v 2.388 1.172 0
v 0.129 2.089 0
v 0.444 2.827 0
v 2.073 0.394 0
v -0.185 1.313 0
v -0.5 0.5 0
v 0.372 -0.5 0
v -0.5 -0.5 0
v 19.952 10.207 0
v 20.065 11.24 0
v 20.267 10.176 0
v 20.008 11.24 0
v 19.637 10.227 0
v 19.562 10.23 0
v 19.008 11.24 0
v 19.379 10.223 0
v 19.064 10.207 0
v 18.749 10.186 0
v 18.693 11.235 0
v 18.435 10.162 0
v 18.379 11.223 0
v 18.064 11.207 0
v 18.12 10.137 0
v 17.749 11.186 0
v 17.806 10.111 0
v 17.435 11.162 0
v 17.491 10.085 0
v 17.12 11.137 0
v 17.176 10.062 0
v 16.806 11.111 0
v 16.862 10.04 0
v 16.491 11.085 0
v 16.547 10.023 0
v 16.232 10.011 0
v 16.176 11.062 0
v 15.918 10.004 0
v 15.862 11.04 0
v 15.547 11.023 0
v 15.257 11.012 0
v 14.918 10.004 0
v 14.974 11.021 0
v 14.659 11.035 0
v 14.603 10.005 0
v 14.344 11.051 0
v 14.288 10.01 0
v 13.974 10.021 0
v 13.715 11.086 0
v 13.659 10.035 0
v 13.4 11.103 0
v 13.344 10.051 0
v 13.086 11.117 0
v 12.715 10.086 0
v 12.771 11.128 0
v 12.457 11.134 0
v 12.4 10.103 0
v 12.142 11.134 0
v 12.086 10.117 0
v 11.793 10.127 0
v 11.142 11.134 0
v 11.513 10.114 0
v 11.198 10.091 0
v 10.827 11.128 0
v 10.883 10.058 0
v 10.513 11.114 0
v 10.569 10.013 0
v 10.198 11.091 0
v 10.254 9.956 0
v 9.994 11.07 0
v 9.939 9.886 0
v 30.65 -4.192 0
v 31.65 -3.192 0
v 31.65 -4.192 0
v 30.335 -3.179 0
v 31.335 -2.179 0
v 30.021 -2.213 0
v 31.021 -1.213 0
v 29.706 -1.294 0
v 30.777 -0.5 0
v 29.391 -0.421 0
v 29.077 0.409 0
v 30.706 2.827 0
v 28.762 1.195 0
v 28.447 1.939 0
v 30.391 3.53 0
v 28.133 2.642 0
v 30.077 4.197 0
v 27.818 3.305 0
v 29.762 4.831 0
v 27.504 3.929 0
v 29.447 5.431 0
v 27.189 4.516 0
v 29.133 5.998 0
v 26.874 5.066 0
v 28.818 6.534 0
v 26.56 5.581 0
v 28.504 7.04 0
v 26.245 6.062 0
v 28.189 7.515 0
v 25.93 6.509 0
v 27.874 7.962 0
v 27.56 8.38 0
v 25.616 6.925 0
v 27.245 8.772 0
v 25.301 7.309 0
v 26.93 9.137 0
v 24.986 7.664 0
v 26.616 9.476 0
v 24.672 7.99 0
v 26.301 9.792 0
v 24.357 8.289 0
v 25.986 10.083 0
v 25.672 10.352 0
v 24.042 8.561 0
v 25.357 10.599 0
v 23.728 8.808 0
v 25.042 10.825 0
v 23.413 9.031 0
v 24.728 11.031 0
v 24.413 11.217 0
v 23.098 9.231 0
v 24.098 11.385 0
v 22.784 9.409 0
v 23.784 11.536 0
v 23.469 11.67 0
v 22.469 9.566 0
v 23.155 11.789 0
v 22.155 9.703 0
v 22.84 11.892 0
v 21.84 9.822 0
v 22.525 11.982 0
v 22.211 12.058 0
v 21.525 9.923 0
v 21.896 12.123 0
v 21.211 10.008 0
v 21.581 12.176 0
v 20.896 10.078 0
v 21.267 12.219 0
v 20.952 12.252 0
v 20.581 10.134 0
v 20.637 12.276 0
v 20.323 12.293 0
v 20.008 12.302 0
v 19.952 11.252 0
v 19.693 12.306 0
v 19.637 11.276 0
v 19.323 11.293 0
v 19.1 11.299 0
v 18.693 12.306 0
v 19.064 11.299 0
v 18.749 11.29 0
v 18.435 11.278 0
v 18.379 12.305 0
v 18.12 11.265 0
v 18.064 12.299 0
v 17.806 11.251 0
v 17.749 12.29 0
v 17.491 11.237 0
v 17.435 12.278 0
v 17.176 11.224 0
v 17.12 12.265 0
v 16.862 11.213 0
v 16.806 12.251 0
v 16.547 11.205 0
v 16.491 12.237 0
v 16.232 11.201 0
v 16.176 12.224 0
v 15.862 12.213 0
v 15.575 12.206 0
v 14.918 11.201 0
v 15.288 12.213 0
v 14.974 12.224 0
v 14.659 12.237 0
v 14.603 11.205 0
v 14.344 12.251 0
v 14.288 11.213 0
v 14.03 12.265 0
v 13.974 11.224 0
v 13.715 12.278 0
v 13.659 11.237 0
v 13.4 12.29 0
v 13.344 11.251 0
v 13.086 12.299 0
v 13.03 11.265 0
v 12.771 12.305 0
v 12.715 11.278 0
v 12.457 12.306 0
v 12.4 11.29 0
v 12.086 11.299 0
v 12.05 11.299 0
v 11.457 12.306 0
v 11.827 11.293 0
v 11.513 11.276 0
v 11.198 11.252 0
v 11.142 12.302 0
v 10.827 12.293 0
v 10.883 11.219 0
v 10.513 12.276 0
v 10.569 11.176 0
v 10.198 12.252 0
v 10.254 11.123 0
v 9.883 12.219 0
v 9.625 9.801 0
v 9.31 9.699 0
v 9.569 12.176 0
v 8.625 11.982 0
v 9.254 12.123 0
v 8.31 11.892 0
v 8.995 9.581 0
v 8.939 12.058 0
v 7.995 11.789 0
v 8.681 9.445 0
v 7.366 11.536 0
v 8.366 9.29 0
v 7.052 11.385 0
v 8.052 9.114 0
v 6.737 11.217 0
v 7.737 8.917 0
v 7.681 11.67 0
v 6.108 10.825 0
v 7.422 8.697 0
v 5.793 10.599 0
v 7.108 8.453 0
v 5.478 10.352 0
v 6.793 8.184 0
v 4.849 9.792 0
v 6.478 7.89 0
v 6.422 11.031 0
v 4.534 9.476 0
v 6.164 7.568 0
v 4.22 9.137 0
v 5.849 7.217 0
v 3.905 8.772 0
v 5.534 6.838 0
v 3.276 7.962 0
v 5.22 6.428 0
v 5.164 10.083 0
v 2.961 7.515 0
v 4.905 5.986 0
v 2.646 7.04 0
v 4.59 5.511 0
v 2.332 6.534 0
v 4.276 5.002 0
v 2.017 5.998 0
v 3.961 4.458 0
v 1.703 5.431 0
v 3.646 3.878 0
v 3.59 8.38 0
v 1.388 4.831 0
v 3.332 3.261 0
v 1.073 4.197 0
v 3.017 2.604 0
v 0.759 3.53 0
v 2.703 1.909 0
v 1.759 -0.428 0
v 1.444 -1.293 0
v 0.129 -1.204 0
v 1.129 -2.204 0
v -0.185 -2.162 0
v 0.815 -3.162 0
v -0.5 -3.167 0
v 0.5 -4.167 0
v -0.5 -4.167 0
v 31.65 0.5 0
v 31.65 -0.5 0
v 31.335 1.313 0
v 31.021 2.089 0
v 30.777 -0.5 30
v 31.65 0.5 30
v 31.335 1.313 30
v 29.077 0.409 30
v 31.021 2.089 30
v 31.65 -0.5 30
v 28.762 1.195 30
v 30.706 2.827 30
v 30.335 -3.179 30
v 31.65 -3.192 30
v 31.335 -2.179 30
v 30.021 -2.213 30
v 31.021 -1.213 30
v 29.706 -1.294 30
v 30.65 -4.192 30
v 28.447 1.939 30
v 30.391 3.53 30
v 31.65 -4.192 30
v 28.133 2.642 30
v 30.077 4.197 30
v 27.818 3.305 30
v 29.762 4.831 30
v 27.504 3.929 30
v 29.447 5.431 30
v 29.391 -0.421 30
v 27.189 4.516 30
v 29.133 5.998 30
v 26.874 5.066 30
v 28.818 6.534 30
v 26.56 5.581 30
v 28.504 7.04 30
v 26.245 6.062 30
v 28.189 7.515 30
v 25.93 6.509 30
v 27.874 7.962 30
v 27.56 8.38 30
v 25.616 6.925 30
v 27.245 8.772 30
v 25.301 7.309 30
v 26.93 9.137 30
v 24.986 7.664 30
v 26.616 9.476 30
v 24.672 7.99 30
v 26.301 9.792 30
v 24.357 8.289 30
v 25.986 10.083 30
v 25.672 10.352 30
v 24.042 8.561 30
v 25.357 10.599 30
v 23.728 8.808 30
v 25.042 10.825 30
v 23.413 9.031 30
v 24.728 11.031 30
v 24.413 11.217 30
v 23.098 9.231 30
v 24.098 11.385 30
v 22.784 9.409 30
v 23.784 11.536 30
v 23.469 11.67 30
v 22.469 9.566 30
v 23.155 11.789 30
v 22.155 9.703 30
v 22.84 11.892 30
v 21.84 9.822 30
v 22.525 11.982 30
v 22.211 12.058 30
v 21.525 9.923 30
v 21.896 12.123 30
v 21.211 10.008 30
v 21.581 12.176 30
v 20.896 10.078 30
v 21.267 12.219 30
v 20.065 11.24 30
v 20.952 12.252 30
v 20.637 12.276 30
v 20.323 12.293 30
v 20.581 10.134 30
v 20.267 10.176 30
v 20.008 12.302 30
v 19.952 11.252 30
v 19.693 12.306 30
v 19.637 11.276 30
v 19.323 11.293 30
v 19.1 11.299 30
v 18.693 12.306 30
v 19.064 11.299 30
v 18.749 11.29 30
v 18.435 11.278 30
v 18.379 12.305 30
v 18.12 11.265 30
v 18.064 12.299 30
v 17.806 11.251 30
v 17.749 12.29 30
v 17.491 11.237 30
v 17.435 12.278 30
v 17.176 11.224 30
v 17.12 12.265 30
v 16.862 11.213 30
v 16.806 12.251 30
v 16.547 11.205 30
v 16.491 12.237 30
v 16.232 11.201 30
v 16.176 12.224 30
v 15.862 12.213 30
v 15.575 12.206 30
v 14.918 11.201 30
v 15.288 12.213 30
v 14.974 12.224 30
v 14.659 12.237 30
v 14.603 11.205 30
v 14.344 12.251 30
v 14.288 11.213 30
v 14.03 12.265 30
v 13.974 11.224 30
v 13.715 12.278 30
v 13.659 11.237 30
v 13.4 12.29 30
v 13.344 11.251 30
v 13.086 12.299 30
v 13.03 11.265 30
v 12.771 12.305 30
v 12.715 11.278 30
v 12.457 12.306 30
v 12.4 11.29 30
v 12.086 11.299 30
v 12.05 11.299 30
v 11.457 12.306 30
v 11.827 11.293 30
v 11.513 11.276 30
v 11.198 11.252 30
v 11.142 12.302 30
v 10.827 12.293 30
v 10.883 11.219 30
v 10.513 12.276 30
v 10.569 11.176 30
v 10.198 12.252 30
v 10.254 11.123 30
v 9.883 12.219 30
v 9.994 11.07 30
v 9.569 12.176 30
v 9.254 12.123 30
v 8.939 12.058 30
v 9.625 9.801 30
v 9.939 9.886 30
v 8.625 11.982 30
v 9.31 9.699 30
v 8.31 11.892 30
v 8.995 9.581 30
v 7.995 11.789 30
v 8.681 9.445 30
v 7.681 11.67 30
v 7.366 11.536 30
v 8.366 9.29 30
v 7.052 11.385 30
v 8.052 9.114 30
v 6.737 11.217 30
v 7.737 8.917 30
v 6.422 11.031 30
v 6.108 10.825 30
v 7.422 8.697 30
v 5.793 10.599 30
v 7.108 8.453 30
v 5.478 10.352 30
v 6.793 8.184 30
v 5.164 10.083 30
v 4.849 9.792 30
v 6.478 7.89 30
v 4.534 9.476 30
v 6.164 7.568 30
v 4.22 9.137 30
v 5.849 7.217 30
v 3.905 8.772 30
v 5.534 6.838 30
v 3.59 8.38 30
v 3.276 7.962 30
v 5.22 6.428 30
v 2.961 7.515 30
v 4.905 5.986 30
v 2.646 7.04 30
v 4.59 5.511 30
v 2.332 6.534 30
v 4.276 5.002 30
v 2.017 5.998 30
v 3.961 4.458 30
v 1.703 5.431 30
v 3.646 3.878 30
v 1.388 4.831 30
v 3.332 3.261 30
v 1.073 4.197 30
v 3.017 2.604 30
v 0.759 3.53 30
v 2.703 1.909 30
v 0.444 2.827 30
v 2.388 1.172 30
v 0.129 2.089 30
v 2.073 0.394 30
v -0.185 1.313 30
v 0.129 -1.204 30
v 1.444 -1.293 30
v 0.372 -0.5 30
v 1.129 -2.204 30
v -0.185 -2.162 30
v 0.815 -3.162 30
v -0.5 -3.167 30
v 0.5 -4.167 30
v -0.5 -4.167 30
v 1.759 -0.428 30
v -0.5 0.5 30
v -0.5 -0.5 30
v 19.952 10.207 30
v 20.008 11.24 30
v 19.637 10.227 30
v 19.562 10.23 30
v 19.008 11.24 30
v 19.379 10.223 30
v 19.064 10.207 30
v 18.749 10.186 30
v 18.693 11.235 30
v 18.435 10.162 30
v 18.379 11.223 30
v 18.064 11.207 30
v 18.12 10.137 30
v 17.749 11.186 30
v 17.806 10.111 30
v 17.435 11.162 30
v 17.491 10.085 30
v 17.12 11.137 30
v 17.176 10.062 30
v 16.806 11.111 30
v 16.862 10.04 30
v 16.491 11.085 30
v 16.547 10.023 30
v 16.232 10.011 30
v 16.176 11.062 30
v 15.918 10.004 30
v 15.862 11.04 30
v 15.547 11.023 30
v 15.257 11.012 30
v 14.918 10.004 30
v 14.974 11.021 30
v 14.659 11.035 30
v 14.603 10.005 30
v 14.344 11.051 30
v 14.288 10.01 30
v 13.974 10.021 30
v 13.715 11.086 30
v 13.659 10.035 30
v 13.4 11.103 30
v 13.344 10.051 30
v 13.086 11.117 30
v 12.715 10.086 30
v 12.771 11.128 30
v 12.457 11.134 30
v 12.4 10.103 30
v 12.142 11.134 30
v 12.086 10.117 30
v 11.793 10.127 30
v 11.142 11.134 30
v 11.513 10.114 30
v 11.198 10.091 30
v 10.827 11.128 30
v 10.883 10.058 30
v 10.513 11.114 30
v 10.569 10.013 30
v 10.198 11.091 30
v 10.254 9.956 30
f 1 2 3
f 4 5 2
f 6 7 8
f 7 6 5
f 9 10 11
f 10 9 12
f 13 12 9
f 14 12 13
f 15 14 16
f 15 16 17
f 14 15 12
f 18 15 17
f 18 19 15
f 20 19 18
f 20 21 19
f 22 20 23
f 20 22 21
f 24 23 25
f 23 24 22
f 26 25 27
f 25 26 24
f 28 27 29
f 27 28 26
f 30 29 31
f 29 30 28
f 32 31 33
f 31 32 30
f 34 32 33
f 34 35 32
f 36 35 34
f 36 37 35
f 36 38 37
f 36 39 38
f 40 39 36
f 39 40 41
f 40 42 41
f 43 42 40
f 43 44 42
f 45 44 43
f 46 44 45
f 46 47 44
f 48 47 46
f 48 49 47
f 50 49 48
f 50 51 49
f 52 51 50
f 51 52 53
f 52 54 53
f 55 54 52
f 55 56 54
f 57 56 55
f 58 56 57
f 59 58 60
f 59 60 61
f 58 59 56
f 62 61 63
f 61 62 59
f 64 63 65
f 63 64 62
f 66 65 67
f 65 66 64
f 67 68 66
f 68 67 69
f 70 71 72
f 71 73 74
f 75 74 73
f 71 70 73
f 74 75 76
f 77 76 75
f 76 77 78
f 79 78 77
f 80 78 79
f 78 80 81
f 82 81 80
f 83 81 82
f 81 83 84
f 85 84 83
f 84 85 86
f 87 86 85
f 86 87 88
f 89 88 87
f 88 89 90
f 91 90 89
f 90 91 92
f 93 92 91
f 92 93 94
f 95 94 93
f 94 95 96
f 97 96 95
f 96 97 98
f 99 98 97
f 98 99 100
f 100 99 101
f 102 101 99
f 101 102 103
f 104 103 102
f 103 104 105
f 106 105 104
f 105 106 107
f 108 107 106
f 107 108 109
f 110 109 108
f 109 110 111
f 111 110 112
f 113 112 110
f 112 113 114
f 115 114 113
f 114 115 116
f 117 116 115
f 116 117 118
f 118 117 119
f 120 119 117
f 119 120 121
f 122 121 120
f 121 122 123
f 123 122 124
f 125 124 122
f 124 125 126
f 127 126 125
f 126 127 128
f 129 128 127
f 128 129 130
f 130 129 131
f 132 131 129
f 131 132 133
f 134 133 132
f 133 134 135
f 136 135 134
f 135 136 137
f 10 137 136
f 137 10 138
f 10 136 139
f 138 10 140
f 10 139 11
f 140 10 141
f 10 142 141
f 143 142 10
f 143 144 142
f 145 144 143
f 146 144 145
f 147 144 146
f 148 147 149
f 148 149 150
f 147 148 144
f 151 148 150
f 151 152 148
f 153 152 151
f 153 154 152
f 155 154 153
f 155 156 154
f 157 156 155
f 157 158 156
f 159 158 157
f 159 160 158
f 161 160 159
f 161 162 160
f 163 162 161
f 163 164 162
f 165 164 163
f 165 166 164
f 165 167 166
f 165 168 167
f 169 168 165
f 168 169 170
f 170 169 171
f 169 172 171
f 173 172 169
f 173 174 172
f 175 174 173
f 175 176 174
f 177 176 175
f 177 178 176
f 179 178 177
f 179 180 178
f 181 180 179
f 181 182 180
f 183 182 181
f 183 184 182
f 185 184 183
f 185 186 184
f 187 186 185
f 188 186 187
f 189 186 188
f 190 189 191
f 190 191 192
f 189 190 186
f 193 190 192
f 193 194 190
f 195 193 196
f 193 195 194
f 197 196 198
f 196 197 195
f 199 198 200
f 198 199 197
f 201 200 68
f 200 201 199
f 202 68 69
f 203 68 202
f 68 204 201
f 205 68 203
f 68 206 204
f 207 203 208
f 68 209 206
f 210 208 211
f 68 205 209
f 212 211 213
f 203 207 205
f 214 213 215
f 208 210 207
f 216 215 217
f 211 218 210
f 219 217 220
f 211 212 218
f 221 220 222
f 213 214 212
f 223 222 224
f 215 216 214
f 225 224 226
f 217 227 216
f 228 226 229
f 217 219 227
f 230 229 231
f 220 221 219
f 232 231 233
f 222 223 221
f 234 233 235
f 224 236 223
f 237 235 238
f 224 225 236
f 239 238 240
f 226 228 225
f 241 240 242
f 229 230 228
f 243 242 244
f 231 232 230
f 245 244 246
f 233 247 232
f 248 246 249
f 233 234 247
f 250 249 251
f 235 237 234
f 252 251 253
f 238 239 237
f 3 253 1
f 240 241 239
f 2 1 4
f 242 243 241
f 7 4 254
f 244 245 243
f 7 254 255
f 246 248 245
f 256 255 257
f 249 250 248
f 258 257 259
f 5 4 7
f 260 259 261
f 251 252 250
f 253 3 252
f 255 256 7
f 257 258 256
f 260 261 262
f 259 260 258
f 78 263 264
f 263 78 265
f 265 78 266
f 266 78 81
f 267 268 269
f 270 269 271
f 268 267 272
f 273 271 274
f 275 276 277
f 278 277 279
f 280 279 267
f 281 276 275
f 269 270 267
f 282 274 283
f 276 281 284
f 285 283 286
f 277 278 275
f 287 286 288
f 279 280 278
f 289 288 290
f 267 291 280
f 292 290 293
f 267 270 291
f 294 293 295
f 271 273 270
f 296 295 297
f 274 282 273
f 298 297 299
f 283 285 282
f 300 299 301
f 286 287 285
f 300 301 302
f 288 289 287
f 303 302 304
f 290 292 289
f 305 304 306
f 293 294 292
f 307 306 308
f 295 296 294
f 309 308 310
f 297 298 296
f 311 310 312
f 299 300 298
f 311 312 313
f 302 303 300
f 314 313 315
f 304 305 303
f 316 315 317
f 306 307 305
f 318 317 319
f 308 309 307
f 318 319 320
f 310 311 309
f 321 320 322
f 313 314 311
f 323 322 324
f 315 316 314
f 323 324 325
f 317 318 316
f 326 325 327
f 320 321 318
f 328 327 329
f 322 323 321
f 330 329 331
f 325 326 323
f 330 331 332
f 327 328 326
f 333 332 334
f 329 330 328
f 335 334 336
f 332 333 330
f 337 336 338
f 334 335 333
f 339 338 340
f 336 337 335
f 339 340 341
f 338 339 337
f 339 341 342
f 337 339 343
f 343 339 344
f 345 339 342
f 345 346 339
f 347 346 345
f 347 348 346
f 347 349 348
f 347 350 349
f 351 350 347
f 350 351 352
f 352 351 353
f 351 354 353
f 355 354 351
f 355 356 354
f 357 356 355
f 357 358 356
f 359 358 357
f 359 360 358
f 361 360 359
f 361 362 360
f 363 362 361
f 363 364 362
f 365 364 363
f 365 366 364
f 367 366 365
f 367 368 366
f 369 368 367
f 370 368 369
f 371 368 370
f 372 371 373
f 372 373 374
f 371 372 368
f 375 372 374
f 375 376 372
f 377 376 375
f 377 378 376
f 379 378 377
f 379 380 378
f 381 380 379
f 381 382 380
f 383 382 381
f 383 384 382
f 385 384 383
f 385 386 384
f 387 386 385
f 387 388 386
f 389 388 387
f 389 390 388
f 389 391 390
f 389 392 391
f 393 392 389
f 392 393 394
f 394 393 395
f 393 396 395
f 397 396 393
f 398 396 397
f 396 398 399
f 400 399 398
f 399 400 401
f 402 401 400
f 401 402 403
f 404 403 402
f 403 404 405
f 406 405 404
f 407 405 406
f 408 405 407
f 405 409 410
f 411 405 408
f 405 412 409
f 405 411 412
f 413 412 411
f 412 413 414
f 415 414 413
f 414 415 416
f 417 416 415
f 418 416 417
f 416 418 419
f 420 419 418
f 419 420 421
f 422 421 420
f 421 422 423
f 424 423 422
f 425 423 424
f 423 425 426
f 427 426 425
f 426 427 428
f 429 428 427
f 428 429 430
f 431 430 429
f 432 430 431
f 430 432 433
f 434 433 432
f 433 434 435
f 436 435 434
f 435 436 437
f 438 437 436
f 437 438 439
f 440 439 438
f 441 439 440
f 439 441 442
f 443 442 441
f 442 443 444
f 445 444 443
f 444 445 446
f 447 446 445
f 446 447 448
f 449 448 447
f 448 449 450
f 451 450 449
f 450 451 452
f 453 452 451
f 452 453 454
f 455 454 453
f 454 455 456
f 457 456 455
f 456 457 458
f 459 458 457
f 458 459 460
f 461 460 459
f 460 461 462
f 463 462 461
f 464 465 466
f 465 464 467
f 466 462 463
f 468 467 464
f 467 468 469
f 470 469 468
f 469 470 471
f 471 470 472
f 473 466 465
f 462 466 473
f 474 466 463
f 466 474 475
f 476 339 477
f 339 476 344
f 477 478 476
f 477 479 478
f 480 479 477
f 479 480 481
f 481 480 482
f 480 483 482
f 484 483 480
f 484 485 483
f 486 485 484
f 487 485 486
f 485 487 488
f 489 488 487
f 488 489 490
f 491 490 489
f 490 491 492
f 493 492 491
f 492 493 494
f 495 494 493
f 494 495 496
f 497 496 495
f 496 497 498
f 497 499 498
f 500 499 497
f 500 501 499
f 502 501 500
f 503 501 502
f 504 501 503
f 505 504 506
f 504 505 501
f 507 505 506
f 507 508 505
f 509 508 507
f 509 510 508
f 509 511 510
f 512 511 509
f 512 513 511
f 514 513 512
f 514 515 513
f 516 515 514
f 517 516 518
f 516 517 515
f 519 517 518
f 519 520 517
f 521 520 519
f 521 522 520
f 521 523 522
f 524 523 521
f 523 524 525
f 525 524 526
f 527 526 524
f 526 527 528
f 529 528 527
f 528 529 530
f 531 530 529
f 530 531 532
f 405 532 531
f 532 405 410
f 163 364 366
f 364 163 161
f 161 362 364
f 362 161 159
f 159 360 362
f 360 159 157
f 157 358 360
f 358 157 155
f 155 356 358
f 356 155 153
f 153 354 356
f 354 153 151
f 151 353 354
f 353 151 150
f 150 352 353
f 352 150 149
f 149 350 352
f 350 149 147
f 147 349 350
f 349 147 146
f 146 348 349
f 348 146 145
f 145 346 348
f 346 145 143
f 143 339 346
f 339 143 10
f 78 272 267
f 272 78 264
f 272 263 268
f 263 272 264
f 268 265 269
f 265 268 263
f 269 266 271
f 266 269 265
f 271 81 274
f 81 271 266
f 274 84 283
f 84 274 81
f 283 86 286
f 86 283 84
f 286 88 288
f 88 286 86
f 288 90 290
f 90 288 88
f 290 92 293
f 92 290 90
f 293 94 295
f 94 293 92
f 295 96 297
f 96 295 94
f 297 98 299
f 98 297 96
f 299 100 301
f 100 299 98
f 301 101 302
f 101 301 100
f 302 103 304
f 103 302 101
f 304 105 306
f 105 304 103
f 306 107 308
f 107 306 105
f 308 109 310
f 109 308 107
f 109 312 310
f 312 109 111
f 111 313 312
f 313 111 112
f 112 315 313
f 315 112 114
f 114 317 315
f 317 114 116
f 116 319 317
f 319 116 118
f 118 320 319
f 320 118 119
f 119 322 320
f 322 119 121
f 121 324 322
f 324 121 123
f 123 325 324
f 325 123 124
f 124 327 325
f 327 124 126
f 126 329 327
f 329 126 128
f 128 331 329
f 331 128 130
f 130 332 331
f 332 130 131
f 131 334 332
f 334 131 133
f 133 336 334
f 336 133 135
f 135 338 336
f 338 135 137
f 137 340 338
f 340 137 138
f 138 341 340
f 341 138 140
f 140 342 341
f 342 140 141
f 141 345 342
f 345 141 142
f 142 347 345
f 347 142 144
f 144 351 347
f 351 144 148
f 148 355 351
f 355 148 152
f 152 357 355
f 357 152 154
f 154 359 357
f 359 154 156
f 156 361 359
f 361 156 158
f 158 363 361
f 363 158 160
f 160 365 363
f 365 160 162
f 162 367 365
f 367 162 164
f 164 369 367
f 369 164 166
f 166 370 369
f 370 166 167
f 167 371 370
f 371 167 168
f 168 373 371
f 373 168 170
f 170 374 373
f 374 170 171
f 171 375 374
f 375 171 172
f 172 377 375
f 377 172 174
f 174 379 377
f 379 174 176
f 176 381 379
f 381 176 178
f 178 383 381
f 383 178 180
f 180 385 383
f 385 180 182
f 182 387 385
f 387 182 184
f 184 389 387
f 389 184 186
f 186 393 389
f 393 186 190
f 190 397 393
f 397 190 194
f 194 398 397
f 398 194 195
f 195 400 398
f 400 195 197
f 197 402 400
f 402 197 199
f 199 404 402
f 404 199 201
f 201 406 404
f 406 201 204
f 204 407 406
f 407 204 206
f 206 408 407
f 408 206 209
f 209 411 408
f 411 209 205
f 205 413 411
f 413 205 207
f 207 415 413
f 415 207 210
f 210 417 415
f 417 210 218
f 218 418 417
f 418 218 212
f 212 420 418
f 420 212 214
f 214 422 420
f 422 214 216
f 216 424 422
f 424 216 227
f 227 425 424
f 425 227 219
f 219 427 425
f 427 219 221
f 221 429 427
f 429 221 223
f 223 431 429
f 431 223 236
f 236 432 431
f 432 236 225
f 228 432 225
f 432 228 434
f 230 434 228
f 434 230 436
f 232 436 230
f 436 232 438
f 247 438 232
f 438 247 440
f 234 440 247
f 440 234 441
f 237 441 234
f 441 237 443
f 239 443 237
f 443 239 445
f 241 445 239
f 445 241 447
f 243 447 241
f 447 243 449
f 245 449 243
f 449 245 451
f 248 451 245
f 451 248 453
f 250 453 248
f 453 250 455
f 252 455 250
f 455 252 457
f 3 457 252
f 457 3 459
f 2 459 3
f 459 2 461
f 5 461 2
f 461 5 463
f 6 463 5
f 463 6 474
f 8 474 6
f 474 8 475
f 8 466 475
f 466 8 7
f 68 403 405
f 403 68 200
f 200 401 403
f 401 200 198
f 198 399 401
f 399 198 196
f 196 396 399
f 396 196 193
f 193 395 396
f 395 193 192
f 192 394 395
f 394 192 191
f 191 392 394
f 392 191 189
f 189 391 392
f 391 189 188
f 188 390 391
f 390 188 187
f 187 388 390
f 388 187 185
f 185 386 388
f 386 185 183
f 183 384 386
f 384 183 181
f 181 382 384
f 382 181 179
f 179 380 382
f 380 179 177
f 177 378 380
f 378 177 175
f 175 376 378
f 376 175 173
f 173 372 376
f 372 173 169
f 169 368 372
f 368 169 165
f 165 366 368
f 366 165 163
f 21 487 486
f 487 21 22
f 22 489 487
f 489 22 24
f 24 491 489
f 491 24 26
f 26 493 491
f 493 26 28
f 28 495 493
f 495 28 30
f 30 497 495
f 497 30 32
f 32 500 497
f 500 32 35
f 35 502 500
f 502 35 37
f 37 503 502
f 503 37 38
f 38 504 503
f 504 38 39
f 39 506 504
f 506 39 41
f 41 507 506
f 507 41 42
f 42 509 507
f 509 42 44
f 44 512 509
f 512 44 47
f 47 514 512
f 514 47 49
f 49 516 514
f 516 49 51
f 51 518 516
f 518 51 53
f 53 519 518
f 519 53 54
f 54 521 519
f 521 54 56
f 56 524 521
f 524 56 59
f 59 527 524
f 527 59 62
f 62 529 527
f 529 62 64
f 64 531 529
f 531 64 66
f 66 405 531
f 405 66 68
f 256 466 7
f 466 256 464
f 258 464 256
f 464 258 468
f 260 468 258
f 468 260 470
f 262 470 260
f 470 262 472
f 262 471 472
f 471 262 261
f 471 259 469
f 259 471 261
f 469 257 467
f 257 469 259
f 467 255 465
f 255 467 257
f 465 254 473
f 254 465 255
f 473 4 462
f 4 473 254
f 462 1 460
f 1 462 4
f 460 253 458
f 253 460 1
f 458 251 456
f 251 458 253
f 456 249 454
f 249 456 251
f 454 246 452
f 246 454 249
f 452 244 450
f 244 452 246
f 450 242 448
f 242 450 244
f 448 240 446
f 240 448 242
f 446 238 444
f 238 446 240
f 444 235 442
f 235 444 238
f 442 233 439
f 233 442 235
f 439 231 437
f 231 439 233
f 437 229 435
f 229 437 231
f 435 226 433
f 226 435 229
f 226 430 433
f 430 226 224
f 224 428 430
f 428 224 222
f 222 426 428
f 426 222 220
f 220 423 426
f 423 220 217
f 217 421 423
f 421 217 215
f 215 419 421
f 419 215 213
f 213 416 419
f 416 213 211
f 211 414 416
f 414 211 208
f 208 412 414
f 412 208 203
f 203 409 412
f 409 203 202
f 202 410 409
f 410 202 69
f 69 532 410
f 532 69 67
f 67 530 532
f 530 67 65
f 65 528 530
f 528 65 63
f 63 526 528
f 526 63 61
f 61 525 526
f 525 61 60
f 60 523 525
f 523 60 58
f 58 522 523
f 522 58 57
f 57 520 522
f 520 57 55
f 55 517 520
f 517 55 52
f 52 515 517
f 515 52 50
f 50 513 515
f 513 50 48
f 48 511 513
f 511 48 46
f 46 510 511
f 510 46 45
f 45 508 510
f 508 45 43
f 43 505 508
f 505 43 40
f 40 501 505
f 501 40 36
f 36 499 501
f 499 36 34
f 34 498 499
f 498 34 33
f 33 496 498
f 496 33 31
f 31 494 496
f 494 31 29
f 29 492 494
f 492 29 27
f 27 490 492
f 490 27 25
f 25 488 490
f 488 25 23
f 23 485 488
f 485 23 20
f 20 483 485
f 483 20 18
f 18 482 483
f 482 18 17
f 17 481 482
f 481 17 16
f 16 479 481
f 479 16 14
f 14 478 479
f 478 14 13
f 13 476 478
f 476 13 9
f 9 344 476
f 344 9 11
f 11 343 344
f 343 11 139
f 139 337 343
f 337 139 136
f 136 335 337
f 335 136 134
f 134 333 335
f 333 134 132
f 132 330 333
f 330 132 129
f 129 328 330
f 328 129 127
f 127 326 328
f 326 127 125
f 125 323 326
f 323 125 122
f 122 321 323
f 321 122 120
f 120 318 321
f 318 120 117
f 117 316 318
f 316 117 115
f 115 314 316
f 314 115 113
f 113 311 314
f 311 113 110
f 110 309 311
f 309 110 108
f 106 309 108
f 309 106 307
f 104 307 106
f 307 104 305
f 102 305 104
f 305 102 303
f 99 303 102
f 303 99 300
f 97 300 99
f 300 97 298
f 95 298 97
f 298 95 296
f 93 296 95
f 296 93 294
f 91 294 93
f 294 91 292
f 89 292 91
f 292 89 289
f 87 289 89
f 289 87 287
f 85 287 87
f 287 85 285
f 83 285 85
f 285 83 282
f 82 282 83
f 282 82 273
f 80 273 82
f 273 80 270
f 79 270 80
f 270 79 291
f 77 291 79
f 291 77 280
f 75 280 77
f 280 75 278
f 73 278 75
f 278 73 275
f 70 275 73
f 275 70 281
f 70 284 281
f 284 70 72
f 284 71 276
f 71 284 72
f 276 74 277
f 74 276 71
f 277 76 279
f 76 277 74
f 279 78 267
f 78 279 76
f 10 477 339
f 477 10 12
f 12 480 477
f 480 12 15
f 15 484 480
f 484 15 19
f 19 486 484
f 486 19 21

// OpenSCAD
points = [[0.000000, 0.000000], [0.314646, 0.813166], [0.629293, 1.588604], [0.943939, 2.327195], [1.258586, 3.029819],
        [1.573232, 3.697357], [1.887879, 4.330690], [2.202525, 4.930697], [2.517172, 5.498261], [2.831818, 6.034260], [
        3.146465, 6.539576], [3.461111, 7.015089], [3.775758, 7.461680], [4.090404, 7.880229], [4.405051, 8.271618], [
        4.719697, 8.636725], [5.034343, 8.976433], [5.348990, 9.291621], [5.663636, 9.583171], [5.978283, 9.851962], [
        6.292929, 10.098875], [6.607576, 10.324791], [6.922222, 10.530590], [7.236869, 10.717153], [7.551515, 10.885360]
    , [7.866162, 11.036093], [8.180808, 11.170231], [8.495455, 11.288655], [8.810101, 11.392246], [9.124747, 11.481884],
        [9.439394, 11.558450], [9.754040, 11.622823], [10.068687, 11.675886], [10.383333, 11.718519], [10.697980,
        11.751601], [11.012626, 11.776013], [11.327273, 11.792637], [11.641919, 11.802352], [11.956566, 11.806040], [
        12.271212, 11.804580], [12.585859, 11.798854], [12.900505, 11.789741], [13.215152, 11.778123], [13.529798,
        11.764879], [13.844444, 11.750892], [14.159091, 11.737040], [14.473737, 11.724205], [14.788384, 11.713267], [
        15.103030, 11.705106], [15.417677, 11.700604], [15.732323, 11.700604], [16.046970, 11.705106], [16.361616,
        11.713267], [16.676263, 11.724205], [16.990909, 11.737040], [17.305556, 11.750892], [17.620202, 11.764879], [
        17.934848, 11.778123], [18.249495, 11.789741], [18.564141, 11.798854], [18.878788, 11.804580], [19.193434,
        11.806040], [19.508081, 11.802352], [19.822727, 11.792637], [20.137374, 11.776013], [20.452020, 11.751601], [
        20.766667, 11.718519], [21.081313, 11.675886], [21.395960, 11.622823], [21.710606, 11.558450], [22.025253,
        11.481884], [22.339899, 11.392246], [22.654545, 11.288655], [22.969192, 11.170231], [23.283838, 11.036093], [
        23.598485, 10.885360], [23.913131, 10.717153], [24.227778, 10.530590], [24.542424, 10.324791], [24.857071,
        10.098875], [25.171717, 9.851962], [25.486364, 9.583171], [25.801010, 9.291621], [26.115657, 8.976433], [
        26.430303, 8.636725], [26.744949, 8.271618], [27.059596, 7.880229], [27.374242, 7.461680], [27.688889, 7.015089]
    , [28.003535, 6.539576], [28.318182, 6.034260], [28.632828, 5.498261], [28.947475, 4.930697], [29.262121, 4.330690],
        [29.576768, 3.697357], [29.891414, 3.029819], [30.206061, 2.327195], [30.520707, 1.588604], [30.835354, 0.813166
        ], [31.150000, 0.000000]];
offsetPoints = [[0.000000, -3.666595], [0.314646, -2.661582], [0.629293, -1.704157], [0.943939, -0.793189], [1.258586,
    0.072457], [1.573232, 0.893916], [1.887879, 1.672320], [2.202525, 2.408804], [2.517172, 3.104502], [2.831818,
    3.760547], [3.146465, 4.378073], [3.461111, 4.958215], [3.775758, 5.502106], [4.090404, 6.010880], [4.405051,
    6.485671], [4.719697, 6.927613], [5.034343, 7.337839], [5.348990, 7.717484], [5.663636, 8.067681], [5.978283,
    8.389565], [6.292929, 8.684269], [6.607576, 8.952927], [6.922222, 9.196672], [7.236869, 9.416640], [7.551515,
    9.613964], [7.866162, 9.789777], [8.180808, 9.945213], [8.495455, 10.081407], [8.810101, 10.199492], [9.124747,
    10.300603], [9.439394, 10.385872], [9.754040, 10.456434], [10.068687, 10.513423], [10.383333, 10.557973], [10.697980
    , 10.591217], [11.012626, 10.614290], [11.327273, 10.628324], [11.641919, 10.634456], [11.956566, 10.633817], [
    12.271212, 10.627542], [12.585859, 10.616765], [12.900505, 10.602619], [13.215152, 10.586239], [13.529798, 10.568759
    ], [13.844444, 10.551312], [14.159091, 10.535032], [14.473737, 10.521054], [14.788384, 10.510510], [15.103030,
    10.504535], [15.417677, 10.504263], [15.732323, 10.510604], [16.046970, 10.523017], [16.361616, 10.540384], [
    16.676263, 10.561585], [16.990909, 10.585500], [17.305556, 10.611008], [17.620202, 10.636989], [17.934848, 10.662324
    ], [18.249495, 10.685893], [18.564141, 10.706574], [18.878788, 10.723249], [19.193434, 10.734797], [19.508081,
    10.740098], [19.822727, 10.738031], [20.137374, 10.727478], [20.452020, 10.707317], [20.766667, 10.676429], [
    21.081313, 10.633693], [21.395960, 10.577990], [21.710606, 10.508199], [22.025253, 10.423200], [22.339899, 10.321874
    ], [22.654545, 10.203100], [22.969192, 10.065757], [23.283838, 9.908727], [23.598485, 9.730888], [23.913131,
    9.531121], [24.227778, 9.308306], [24.542424, 9.061323], [24.857071, 8.789050], [25.171717, 8.490370], [25.486364,
    8.164160], [25.801010, 7.809302], [26.115657, 7.424675], [26.430303, 7.009158], [26.744949, 6.561633], [27.059596,
    6.080979], [27.374242, 5.566075], [27.688889, 5.015802], [28.003535, 4.429040], [28.318182, 3.804668], [28.632828,
    3.141567], [28.947475, 2.438616], [29.262121, 1.694695], [29.576768, 0.908684], [29.891414, 0.079464], [30.206061, -
0.794087], [30.520707, -1.713087], [30.835354, -2.678658], [31.150000, -3.691920]];
height = 30;

module polyline(points, width) {
    for (i = [0:len(points) - 2])
    hull() {
        translate(points[i]) square([width, width], true);
        translate(points[i + 1]) square([width, width], true);
    }
}
// Utility function to offset points for the female mold
function offset_points(points, offset) = [
    for (point = points)
        [point[0] /*+ offset*/, point[1] + offset]  // Simple offset, adjust as needed for accuracy
    ];

// Module to create the male part
module male_part(points, height) {
    linear_extrude(height = height)
        polyline(points, 1);
}

// Module to create the female part
module female_part(points, height, offset) {
    linear_extrude(height = height)  // Slightly taller to accommodate the sheet metal thickness
        polyline(offsetPoints, 1);  // Adjust the offset as needed
}

// Create the male and female parts
color("white") male_part(points, 30);  // Example usage
translate([0, 0, 0])  // Adjust position as needed
    female_part(points, 30, 2);  // Assuming 2mm offset for the thickness of the sheet metal

/**linear_extrude(height = height)
polyline(points, 1);
*/
